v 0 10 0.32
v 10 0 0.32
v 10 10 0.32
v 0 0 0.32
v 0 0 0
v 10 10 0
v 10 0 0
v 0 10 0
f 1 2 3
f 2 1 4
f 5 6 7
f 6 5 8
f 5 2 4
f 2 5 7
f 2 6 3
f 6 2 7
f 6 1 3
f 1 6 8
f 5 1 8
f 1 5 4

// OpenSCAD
first_layer_height = 0.24;
layer_height = 0.08;

edge = 10;

cube(
    [edge,
    edge,
    first_layer_height+ layer_height,
    ],
    center=false);
